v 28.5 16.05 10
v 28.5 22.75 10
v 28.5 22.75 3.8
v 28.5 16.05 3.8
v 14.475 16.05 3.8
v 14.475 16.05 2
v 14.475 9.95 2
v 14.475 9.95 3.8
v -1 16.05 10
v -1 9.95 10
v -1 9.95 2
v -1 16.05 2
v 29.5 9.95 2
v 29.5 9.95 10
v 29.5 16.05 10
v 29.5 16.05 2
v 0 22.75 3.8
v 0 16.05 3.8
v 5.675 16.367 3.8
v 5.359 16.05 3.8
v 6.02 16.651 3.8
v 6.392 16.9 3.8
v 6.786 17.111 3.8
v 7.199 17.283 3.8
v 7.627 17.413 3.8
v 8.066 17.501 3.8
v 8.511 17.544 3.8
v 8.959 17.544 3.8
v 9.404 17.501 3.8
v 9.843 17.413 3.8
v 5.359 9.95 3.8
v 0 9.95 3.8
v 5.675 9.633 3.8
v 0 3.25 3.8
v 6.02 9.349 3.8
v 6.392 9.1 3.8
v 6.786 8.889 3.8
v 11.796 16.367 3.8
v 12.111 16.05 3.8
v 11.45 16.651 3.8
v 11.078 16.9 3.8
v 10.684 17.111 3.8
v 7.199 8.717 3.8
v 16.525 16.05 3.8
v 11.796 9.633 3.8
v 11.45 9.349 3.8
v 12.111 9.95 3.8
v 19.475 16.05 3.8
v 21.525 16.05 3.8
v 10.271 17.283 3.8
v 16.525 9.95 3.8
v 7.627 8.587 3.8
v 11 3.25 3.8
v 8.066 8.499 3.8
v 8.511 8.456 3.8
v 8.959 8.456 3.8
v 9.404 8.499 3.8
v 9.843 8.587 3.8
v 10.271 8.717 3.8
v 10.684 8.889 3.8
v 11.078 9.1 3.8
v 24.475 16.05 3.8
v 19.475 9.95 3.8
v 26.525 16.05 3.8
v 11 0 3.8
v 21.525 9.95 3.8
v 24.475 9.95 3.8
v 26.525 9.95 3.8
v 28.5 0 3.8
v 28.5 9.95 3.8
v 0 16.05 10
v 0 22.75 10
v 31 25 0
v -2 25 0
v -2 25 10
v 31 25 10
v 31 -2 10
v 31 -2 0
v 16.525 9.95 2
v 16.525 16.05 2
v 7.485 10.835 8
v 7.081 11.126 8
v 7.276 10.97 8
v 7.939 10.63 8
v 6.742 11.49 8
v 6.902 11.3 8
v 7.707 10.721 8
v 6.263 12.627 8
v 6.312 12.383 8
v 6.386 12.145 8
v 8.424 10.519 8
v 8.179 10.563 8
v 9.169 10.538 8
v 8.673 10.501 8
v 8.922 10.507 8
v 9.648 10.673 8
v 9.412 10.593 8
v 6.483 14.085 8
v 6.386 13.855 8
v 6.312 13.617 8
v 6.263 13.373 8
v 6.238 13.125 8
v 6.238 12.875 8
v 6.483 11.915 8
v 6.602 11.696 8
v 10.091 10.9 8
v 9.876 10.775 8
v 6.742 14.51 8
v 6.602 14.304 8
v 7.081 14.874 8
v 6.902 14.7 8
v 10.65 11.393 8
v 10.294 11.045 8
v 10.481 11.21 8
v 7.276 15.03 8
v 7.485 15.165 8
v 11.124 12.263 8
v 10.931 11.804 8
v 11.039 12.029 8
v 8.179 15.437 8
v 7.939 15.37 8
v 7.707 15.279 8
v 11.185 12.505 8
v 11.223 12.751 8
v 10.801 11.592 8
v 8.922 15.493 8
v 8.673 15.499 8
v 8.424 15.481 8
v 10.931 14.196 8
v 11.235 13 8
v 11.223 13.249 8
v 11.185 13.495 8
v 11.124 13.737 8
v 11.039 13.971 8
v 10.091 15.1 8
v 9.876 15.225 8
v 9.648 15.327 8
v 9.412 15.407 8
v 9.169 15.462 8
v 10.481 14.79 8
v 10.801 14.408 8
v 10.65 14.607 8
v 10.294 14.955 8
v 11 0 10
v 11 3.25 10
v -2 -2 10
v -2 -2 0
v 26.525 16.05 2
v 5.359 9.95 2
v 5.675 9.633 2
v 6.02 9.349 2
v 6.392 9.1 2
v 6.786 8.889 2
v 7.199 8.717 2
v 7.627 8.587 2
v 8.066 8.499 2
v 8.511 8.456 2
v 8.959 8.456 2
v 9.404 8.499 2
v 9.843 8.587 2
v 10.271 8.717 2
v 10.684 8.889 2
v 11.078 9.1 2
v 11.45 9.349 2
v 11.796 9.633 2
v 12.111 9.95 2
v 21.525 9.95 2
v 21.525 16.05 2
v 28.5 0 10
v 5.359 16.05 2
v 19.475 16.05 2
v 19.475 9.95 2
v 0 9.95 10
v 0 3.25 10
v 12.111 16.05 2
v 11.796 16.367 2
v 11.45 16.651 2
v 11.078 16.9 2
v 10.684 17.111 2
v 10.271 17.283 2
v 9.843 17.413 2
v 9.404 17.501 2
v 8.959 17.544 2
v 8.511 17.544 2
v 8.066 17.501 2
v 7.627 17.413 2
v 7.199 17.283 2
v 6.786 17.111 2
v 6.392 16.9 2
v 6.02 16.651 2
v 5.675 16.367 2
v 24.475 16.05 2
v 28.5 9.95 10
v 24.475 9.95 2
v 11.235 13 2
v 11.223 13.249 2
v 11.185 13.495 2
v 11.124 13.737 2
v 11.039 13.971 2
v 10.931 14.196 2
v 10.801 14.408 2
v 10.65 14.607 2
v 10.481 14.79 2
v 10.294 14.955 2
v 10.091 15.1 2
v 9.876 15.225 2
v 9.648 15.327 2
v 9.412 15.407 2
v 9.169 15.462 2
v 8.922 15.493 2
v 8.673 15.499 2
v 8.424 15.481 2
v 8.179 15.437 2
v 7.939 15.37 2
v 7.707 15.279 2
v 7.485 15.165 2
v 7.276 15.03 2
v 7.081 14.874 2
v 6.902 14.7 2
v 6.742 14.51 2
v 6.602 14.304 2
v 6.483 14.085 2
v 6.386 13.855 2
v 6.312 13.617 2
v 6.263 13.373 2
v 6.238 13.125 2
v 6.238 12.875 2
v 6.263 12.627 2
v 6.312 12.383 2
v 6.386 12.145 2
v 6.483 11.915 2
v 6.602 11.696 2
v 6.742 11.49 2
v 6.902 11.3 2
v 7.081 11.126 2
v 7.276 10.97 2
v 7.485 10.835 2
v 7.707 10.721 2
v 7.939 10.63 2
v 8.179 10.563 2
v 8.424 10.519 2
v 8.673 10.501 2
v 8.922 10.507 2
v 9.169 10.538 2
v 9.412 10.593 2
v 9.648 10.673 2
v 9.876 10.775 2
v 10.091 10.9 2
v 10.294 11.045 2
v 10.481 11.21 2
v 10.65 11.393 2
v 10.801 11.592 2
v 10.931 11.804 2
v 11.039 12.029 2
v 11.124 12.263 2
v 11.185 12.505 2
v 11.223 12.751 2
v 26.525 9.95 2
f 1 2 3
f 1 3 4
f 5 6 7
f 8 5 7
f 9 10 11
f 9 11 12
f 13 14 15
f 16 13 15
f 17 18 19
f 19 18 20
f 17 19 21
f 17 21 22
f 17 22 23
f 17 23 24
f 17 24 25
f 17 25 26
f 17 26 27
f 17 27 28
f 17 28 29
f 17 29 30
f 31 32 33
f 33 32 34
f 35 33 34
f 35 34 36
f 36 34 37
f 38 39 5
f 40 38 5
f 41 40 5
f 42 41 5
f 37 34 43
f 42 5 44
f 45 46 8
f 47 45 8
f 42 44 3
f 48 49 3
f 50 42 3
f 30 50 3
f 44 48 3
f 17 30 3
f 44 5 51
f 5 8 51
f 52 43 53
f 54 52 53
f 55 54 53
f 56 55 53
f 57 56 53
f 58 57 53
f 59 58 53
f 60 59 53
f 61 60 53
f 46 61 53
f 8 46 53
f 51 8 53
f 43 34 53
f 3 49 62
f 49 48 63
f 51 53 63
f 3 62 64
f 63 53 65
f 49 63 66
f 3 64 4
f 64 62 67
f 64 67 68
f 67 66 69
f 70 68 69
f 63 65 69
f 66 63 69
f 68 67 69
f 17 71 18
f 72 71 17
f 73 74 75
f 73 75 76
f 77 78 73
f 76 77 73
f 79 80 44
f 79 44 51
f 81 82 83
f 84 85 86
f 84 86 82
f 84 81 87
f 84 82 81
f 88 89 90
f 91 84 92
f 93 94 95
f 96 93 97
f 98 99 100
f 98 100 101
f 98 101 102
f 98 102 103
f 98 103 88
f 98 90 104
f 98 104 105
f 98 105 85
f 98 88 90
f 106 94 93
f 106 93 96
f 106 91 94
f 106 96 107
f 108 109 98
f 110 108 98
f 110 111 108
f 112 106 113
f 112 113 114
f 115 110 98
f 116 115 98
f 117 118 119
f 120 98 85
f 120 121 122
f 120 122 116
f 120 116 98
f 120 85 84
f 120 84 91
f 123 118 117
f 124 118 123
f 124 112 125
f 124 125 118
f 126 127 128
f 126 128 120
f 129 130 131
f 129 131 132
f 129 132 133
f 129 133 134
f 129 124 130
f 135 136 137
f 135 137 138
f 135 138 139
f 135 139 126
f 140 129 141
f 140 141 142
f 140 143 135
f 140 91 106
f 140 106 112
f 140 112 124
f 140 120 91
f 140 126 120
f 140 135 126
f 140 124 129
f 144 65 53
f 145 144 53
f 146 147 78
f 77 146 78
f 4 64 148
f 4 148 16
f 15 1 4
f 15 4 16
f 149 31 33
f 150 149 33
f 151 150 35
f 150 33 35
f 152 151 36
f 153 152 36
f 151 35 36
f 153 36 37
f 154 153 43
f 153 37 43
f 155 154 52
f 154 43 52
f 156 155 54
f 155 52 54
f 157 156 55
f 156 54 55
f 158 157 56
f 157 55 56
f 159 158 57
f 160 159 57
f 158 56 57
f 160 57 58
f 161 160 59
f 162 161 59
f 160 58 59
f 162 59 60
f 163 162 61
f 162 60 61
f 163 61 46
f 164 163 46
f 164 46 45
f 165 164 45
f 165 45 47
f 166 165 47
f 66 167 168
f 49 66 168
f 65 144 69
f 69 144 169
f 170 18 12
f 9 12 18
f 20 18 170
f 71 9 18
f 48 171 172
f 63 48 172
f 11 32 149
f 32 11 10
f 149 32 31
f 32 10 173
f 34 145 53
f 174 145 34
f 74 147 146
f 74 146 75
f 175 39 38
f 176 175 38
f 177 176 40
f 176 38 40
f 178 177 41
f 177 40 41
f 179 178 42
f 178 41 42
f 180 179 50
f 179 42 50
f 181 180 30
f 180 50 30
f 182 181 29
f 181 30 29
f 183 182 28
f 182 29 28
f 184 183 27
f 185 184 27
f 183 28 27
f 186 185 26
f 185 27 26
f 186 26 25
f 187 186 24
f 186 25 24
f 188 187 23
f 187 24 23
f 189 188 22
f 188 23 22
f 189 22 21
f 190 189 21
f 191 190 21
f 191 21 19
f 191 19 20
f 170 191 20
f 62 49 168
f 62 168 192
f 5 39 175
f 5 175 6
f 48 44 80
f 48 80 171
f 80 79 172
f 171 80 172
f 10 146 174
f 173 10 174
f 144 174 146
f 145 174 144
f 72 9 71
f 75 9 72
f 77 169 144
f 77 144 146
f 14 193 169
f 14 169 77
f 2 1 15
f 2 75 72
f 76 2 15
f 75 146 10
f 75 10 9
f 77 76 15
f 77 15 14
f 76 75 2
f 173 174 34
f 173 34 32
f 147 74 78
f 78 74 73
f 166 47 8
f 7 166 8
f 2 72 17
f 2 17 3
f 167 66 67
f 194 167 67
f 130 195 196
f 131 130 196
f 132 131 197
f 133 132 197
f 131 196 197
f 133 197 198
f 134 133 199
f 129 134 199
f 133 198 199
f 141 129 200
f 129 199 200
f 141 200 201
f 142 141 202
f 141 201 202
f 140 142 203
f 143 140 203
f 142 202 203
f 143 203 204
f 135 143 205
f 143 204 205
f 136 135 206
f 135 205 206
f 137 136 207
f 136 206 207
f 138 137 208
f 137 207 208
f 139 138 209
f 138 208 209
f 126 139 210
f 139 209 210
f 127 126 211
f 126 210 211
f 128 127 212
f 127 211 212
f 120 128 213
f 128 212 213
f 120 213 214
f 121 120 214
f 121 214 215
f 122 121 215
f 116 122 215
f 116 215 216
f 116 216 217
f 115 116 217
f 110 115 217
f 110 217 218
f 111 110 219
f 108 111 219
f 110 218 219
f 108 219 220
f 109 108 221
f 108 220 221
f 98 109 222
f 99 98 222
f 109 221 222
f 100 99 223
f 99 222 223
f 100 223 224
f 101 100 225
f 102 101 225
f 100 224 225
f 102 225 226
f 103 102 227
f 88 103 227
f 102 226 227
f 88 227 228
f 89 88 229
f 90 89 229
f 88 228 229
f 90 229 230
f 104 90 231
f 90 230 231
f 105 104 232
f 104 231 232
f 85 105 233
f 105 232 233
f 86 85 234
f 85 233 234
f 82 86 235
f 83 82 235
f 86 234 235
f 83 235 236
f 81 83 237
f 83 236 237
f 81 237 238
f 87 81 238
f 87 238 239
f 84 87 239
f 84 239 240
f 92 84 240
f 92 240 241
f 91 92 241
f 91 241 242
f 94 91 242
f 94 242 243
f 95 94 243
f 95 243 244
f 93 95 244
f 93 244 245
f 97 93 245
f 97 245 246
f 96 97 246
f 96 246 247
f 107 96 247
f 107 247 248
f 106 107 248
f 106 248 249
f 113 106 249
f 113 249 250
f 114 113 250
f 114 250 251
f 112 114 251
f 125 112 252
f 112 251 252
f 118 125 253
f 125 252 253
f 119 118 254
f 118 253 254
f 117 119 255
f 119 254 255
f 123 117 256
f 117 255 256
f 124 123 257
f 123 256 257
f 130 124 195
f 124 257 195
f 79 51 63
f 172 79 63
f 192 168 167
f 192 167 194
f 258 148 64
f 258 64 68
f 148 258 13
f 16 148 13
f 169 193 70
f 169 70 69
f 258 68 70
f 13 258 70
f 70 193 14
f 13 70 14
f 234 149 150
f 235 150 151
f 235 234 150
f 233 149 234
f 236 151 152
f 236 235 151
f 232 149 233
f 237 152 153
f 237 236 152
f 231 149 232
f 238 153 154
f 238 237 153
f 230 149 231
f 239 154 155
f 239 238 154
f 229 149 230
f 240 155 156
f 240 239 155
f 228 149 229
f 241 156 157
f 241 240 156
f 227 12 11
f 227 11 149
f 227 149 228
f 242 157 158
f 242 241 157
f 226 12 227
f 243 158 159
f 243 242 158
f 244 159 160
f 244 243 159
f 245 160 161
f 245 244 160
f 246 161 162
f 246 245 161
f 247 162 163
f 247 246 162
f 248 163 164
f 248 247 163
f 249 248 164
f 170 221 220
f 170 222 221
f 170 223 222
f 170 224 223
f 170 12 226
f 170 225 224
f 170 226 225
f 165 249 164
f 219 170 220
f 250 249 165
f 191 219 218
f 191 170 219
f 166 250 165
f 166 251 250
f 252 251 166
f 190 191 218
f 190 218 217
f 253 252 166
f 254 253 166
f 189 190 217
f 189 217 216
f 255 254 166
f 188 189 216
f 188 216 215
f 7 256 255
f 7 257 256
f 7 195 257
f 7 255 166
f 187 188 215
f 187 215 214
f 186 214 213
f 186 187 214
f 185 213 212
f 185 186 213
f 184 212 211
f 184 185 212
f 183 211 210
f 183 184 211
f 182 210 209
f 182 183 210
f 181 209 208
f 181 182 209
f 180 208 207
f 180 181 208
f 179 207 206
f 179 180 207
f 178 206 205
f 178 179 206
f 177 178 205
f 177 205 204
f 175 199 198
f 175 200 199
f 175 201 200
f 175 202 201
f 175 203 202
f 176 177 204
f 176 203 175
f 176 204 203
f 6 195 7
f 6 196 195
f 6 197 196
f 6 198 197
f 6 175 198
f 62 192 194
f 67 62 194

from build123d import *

# Parameters (mm, degrees)
PAD004_DEPTH             = 8.2
SKETCH014_W              = 28.5
SKETCH014_H              = 6.1
PAD005_DEPTH             = 1.8
SKETCH015_R              = 2.9
POCKET004_DEPTH          = 0.6
SKETCH016_W              = 2.05
SKETCH016_H              = 6.1
POCKET005_DEPTH          = 1.8
CLONE012_PLACEMENT_ANGLE = 180
BOX_W                    = 33
BOX_H                    = 27
BOX_DEPTH                = 10
SKETCH_W                 = 3
SKETCH_H                 = 3.25
POCKET009_DEPTH          = 6.2
SKETCH021_W              = 1
SKETCH021_H              = 6.1
POCKET010_DEPTH          = 8
SKETCH022_R              = 4.55
POCKET011_DEPTH          = 1.8
SKETCH023_R              = 2.5
PAD_DEPTH                = 6


with BuildPart() as body011:
    # Sketch013 → Pad004 (new body)
    with BuildSketch(Plane.XY):
        with BuildLine():
            Line((0, 0), (28.5, 0))
            Line((28.5, 0), (28.5, 22.75))
            Line((28.5, 22.75), (14, 22.75))
            Line((14, 22.75), (14, 22.5))
            ThreePointArc((11, 19.5), (13.12132, 20.37868), (14, 22.5))
            Line((11, 19.5), (0, 19.5))
            Line((0, 19.5), (0, 0))
        make_face()
    extrude(amount=PAD004_DEPTH)

    # Sketch014 (on Face9 of Pad004) → Pad005 (join)
    with BuildSketch(Plane.XY.offset(8.2)):
        with Locations((14.25, 9.75)):
            Rectangle(SKETCH014_W, SKETCH014_H)
    extrude(amount=PAD005_DEPTH)

    # Sketch015 (on Face11 of Pad005) → Pocket004 (cut)
    with BuildSketch(Plane.XY.offset(10)):
        with Locations((8.735056, 9.75)):
            Circle(SKETCH015_R)
    extrude(amount=-POCKET004_DEPTH, mode=Mode.SUBTRACT)

    # Sketch016 (on Face10 of Pocket004) → Pocket005 (cut)
    with BuildSketch(Plane.XY.offset(10)):
        with Locations((15.5, 9.75)):
            Rectangle(SKETCH016_W, SKETCH016_H)
        Polygon((21.525, 12.8), (21.525, 6.7), (19.475, 6.7), (19.475, 12.8), (20.5, 12.8), align=None)
        with Locations((25.5, 9.75)):
            Rectangle(SKETCH016_W, SKETCH016_H)
    extrude(amount=-POCKET005_DEPTH, mode=Mode.SUBTRACT)


with BuildPart() as body011_1:
    # Clone012 placement: moved
    add(body011.part.moved(Location((0, 22.75, 12))).rotate(Axis((0, 22.75, 12), (1, 0, 0)), CLONE012_PLACEMENT_ANGLE))


with BuildPart() as model_body012:
    # Box → Box (new body)
    with BuildSketch(Plane(origin=(-2, -2, 0), x_dir=(1, 0, 0), z_dir=(0, 0, 1))):
        with Locations((16.5, 13.5)):
            Rectangle(BOX_W, BOX_H)
    extrude(amount=BOX_DEPTH)

    # Cut: cut Body011
    add(body011_1.part, mode=Mode.SUBTRACT)

    # Sketch (on Face3 of BaseFeature001) → Pocket009 (cut)
    with BuildSketch(Plane.XY.offset(10)):
        with Locations((12.5, 1.625)):
            Rectangle(SKETCH_W, SKETCH_H)
    extrude(amount=-POCKET009_DEPTH, mode=Mode.SUBTRACT)

    # Sketch021 (on Face3 of Pocket009) → Pocket010 (cut)
    with BuildSketch(Plane.XY.offset(10)):
        with Locations((-0.5, 13)):
            Rectangle(SKETCH021_W, SKETCH021_H)
        with Locations((29, 13)):
            Rectangle(SKETCH021_W, SKETCH021_H)
    extrude(amount=-POCKET010_DEPTH, mode=Mode.SUBTRACT)

    # Sketch022 (on Face17 of Pocket010) → Pocket011 (cut)
    with BuildSketch(Plane.XY.offset(3.8)):
        with Locations((8.735056, 13)):
            Circle(SKETCH022_R)
    extrude(amount=-POCKET011_DEPTH, mode=Mode.SUBTRACT)

    # Sketch023 (on Face39 of Pocket011) → Pad (join)
    with BuildSketch(Plane.XY.offset(2)):
        with Locations((8.735056, 13)):
            Circle(SKETCH023_R)
    extrude(amount=PAD_DEPTH)


solid = model_body012.part
